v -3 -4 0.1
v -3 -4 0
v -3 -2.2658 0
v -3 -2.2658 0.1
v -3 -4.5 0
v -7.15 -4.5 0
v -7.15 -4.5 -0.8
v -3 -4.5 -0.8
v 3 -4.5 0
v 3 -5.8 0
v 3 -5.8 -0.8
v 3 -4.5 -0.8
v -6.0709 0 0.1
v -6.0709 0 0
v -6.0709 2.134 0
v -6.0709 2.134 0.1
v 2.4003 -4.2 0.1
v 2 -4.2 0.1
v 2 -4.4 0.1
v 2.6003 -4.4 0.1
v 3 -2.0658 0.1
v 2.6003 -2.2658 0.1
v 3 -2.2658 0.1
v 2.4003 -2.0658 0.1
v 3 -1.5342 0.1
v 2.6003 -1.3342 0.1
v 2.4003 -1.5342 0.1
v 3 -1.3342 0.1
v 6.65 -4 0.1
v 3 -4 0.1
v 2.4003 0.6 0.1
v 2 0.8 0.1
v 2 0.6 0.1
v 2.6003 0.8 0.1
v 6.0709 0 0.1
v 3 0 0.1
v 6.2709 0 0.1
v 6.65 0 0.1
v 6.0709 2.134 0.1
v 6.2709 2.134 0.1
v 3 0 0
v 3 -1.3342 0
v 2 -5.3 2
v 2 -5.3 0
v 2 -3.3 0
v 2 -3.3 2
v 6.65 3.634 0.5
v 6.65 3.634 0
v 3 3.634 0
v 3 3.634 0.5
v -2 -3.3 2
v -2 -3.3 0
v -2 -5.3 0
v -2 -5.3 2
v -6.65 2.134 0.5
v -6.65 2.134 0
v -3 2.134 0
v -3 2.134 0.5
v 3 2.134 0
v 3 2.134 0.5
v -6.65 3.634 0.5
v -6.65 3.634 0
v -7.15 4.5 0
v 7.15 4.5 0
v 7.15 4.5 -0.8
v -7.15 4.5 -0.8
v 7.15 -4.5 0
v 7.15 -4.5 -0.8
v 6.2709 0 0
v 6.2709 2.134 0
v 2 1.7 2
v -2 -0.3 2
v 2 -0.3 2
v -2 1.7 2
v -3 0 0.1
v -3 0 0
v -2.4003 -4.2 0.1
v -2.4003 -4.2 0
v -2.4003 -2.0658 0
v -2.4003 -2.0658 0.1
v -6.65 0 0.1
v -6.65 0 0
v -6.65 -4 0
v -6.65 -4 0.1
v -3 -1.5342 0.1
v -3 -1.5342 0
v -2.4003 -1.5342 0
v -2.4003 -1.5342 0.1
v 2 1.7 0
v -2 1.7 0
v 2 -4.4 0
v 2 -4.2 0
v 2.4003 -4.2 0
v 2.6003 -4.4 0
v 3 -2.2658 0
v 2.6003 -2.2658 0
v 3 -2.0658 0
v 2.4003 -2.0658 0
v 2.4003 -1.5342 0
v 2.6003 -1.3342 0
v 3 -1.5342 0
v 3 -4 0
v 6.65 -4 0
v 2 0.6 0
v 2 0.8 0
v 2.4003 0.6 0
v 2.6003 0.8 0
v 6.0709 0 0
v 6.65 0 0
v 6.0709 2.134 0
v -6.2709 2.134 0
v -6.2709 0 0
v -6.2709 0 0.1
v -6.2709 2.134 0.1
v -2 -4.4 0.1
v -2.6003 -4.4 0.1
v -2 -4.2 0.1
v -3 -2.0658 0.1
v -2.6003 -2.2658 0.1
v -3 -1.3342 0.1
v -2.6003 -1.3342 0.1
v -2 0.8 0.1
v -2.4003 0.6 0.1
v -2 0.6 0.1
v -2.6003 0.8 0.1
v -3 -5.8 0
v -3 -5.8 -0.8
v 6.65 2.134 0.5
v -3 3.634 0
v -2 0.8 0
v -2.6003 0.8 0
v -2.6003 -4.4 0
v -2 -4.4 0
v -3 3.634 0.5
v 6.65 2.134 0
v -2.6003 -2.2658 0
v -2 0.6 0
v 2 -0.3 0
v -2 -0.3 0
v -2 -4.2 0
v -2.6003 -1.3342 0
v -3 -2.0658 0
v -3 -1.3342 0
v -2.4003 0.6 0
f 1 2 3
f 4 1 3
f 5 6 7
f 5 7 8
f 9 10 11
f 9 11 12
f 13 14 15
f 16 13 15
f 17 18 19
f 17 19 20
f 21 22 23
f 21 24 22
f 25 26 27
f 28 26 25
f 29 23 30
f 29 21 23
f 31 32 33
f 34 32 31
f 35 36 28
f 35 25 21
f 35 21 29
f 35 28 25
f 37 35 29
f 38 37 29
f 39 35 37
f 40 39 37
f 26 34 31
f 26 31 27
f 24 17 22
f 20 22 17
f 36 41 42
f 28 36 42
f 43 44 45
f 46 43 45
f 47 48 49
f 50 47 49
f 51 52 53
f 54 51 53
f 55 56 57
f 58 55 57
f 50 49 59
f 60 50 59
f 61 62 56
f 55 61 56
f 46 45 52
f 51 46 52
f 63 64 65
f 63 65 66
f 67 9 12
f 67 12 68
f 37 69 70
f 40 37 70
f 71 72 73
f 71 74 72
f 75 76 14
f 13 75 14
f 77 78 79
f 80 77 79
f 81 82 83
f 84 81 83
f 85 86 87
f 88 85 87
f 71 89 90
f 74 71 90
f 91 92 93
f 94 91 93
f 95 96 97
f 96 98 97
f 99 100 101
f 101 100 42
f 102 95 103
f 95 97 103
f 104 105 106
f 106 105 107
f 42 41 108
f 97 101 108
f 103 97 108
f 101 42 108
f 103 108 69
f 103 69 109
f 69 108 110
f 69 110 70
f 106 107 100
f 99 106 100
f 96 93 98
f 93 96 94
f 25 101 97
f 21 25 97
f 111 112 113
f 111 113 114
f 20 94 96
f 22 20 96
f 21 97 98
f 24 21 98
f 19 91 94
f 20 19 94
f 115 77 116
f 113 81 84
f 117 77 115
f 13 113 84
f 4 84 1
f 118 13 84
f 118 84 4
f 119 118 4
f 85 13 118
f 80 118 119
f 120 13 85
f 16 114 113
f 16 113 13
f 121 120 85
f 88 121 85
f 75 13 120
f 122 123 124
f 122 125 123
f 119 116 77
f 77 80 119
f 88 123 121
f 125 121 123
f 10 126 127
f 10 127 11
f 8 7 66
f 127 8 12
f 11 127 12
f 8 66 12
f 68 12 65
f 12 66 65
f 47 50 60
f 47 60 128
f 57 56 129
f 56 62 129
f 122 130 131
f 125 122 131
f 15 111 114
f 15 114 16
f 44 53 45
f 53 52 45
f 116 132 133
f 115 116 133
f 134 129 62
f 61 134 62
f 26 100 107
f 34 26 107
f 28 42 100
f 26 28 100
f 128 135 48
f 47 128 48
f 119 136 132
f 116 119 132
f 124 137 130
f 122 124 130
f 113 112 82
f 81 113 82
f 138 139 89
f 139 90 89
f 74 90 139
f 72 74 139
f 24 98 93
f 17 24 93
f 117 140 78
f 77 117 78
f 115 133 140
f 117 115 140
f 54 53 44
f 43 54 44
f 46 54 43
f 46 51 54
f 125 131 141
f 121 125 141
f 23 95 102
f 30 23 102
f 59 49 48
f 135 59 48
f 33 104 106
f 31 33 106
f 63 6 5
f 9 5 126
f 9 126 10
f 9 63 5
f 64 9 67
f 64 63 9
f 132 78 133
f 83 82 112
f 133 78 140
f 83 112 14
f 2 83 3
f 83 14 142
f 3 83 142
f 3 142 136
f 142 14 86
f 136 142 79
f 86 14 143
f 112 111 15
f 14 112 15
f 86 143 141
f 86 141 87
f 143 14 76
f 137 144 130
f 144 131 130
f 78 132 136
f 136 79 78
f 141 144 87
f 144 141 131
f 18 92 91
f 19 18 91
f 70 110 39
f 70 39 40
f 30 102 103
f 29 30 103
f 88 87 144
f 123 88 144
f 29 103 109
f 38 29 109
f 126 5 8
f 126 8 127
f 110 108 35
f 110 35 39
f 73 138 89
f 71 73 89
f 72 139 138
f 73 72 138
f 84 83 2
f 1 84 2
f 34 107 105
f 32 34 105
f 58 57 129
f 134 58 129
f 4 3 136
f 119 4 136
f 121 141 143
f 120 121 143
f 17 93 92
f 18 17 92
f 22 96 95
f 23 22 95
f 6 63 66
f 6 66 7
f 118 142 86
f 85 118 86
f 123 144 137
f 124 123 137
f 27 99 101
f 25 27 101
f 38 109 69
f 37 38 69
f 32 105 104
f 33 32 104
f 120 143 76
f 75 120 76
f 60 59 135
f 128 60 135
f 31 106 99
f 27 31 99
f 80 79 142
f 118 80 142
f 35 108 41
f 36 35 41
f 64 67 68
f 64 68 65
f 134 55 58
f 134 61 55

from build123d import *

# Parameters (mm, degrees)
F0_W     = 0.2
F0_H     = 2.1339745962
F1_DEPTH = 0.1
F2_DEPTH = 0.8
F3_DEPTH = 0.5
F4_DEPTH = 2


with BuildPart() as f1:
    # F0 (on Top) → F1 (new body)
    with BuildSketch(Plane.XY):
        Polygon((-6.65, 0), (-6.65, -4), (-3, -4), (-3, -2.2657535192), (-3, -2.0657535192), (-3, -1.5342464808), (-3, -1.3342464808), (-3, 0), (-6.0708631158, 0), (-6.2708631158, 0), align=None)
        with Locations((-6.1708631158, 1.0669872981)):
            Rectangle(F0_W, F0_H)
        Polygon((-3, -1.3342464808), (-3, -1.5342464808), (-2.4003390085, -1.5342464808), (-2.4003390085, 0.6), (-2, 0.6), (-2, 0.8), (-2.6003390085, 0.8), (-2.6003390085, -1.3342464808), align=None)
        Polygon((-3, -2.0657535192), (-3, -2.2657535192), (-2.6003390085, -2.2657535192), (-2.6003390085, -4.4), (-2, -4.4), (-2, -4.2), (-2.4003390085, -4.2), (-2.4003390085, -2.0657535192), align=None)
    extrude(amount=F1_DEPTH)


with BuildPart() as f1b:
    # F0 (on Top) → F1, piece 2 (new body)
    with BuildSketch(Plane.XY):
        Polygon((3, -2.0657535192), (3, -2.2657535192), (3, -4), (6.65, -4), (6.65, 0), (6.2708631158, 0), (6.0708631158, 0), (3, 0), (3, -1.3342464808), (3, -1.5342464808), align=None)
        with Locations((6.1708631158, 1.0669872981)):
            Rectangle(F0_W, F0_H)
        Polygon((2, 0.8), (2, 0.6), (2.4003390085, 0.6), (2.4003390085, -1.5342464808), (3, -1.5342464808), (3, -1.3342464808), (2.6003390085, -1.3342464808), (2.6003390085, 0.8), align=None)
        Polygon((2, -4.2), (2, -4.4), (2.6003390085, -4.4), (2.6003390085, -2.2657535192), (3, -2.2657535192), (3, -2.0657535192), (2.4003390085, -2.0657535192), (2.4003390085, -4.2), align=None)
    extrude(amount=F1_DEPTH)


with BuildPart() as f2:
    # F0 (on Top) → F2 (new body)
    with BuildSketch(Plane.XY):
        Polygon((7.15, 4.5), (-7.15, 4.5), (-7.15, -4.5), (-3, -4.5), (-3, -5.8), (3, -5.8), (3, -4.5), (7.15, -4.5), align=None)
        Polygon((-3, -4), (-6.65, -4), (-6.65, 0), (-6.2708631158, 0), (-6.2708631158, 2.1339745962), (-6.65, 2.1339745962), (-6.65, 3.6339745962), (-3, 3.6339745962), (-3, 2.1339745962), (-6.0708631158, 2.1339745962), (-6.0708631158, 0), (-3, 0), (-3, -1.3342464808), (-2.6003390085, -1.3342464808), (-2.6003390085, 0.8), (-2, 0.8), (-2, 1.7), (2, 1.7), (2, 0.8), (2.6003390085, 0.8), (2.6003390085, -1.3342464808), (3, -1.3342464808), (3, 0), (6.0708631158, 0), (6.0708631158, 2.1339745962), (3, 2.1339745962), (3, 3.6339745962), (6.65, 3.6339745962), (6.65, 2.1339745962), (6.2708631158, 2.1339745962), (6.2708631158, 0), (6.65, 0), (6.65, -4), (3, -4), (3, -2.2657535192), (2.6003390085, -2.2657535192), (2.6003390085, -4.4), (2, -4.4), (2, -5.3), (-2, -5.3), (-2, -4.4), (-2.6003390085, -4.4), (-2.6003390085, -2.2657535192), (-3, -2.2657535192), align=None, mode=Mode.SUBTRACT)
        Polygon((-3, -1.5342464808), (-3, -2.0657535192), (-2.4003390085, -2.0657535192), (-2.4003390085, -4.2), (-2, -4.2), (-2, -3.3), (2, -3.3), (2, -4.2), (2.4003390085, -4.2), (2.4003390085, -2.0657535192), (3, -2.0657535192), (3, -1.5342464808), (2.4003390085, -1.5342464808), (2.4003390085, 0.6), (2, 0.6), (2, -0.3), (-2, -0.3), (-2, 0.6), (-2.4003390085, 0.6), (-2.4003390085, -1.5342464808), align=None)
        Polygon((-6.65, 0), (-6.65, -4), (-3, -4), (-3, -2.2657535192), (-3, -2.0657535192), (-3, -1.5342464808), (-3, -1.3342464808), (-3, 0), (-6.0708631158, 0), (-6.2708631158, 0), align=None)
        Polygon((-3, -2.0657535192), (-3, -2.2657535192), (-2.6003390085, -2.2657535192), (-2.6003390085, -4.4), (-2, -4.4), (-2, -4.2), (-2.4003390085, -4.2), (-2.4003390085, -2.0657535192), align=None)
        Polygon((-3, -1.3342464808), (-3, -1.5342464808), (-2.4003390085, -1.5342464808), (-2.4003390085, 0.6), (-2, 0.6), (-2, 0.8), (-2.6003390085, 0.8), (-2.6003390085, -1.3342464808), align=None)
        Polygon((-2, -4.2), (-2, -4.4), (-2, -5.3), (2, -5.3), (2, -4.4), (2, -4.2), (2, -3.3), (-2, -3.3), align=None)
        Polygon((-2, 0.8), (-2, 0.6), (-2, -0.3), (2, -0.3), (2, 0.6), (2, 0.8), (2, 1.7), (-2, 1.7), align=None)
        Polygon((-6.65, 2.1339745962), (-6.2708631158, 2.1339745962), (-6.0708631158, 2.1339745962), (-3, 2.1339745962), (-3, 3.6339745962), (-6.65, 3.6339745962), align=None)
        with Locations((-6.1708631158, 1.0669872981)):
            Rectangle(F0_W, F0_H)
        Polygon((3, -2.0657535192), (3, -2.2657535192), (3, -4), (6.65, -4), (6.65, 0), (6.2708631158, 0), (6.0708631158, 0), (3, 0), (3, -1.3342464808), (3, -1.5342464808), align=None)
        Polygon((2, -4.2), (2, -4.4), (2.6003390085, -4.4), (2.6003390085, -2.2657535192), (3, -2.2657535192), (3, -2.0657535192), (2.4003390085, -2.0657535192), (2.4003390085, -4.2), align=None)
        Polygon((2, 0.8), (2, 0.6), (2.4003390085, 0.6), (2.4003390085, -1.5342464808), (3, -1.5342464808), (3, -1.3342464808), (2.6003390085, -1.3342464808), (2.6003390085, 0.8), align=None)
        Polygon((6.0708631158, 2.1339745962), (6.2708631158, 2.1339745962), (6.65, 2.1339745962), (6.65, 3.6339745962), (3, 3.6339745962), (3, 2.1339745962), align=None)
        with Locations((6.1708631158, 1.0669872981)):
            Rectangle(F0_W, F0_H)
    extrude(amount=-F2_DEPTH)


with BuildPart() as f3:
    # F0 (on Top) → F3 (new body)
    with BuildSketch(Plane.XY):
        Polygon((-6.65, 2.1339745962), (-6.2708631158, 2.1339745962), (-6.0708631158, 2.1339745962), (-3, 2.1339745962), (-3, 3.6339745962), (-6.65, 3.6339745962), align=None)
    extrude(amount=F3_DEPTH)


with BuildPart() as f3b:
    # F0 (on Top) → F3, piece 2 (new body)
    with BuildSketch(Plane.XY):
        Polygon((6.0708631158, 2.1339745962), (6.2708631158, 2.1339745962), (6.65, 2.1339745962), (6.65, 3.6339745962), (3, 3.6339745962), (3, 2.1339745962), align=None)
    extrude(amount=F3_DEPTH)


with BuildPart() as f4:
    # F0 (on Top) → F4 (new body)
    with BuildSketch(Plane.XY):
        Polygon((-2, 0.8), (-2, 0.6), (-2, -0.3), (2, -0.3), (2, 0.6), (2, 0.8), (2, 1.7), (-2, 1.7), align=None)
    extrude(amount=F4_DEPTH)


with BuildPart() as f4b:
    # F0 (on Top) → F4, piece 2 (new body)
    with BuildSketch(Plane.XY):
        Polygon((-2, -4.2), (-2, -4.4), (-2, -5.3), (2, -5.3), (2, -4.4), (2, -4.2), (2, -3.3), (-2, -3.3), align=None)
    extrude(amount=F4_DEPTH)


solid = Compound([f1.part, f1b.part, f2.part, f3.part, f3b.part, f4.part, f4b.part])
